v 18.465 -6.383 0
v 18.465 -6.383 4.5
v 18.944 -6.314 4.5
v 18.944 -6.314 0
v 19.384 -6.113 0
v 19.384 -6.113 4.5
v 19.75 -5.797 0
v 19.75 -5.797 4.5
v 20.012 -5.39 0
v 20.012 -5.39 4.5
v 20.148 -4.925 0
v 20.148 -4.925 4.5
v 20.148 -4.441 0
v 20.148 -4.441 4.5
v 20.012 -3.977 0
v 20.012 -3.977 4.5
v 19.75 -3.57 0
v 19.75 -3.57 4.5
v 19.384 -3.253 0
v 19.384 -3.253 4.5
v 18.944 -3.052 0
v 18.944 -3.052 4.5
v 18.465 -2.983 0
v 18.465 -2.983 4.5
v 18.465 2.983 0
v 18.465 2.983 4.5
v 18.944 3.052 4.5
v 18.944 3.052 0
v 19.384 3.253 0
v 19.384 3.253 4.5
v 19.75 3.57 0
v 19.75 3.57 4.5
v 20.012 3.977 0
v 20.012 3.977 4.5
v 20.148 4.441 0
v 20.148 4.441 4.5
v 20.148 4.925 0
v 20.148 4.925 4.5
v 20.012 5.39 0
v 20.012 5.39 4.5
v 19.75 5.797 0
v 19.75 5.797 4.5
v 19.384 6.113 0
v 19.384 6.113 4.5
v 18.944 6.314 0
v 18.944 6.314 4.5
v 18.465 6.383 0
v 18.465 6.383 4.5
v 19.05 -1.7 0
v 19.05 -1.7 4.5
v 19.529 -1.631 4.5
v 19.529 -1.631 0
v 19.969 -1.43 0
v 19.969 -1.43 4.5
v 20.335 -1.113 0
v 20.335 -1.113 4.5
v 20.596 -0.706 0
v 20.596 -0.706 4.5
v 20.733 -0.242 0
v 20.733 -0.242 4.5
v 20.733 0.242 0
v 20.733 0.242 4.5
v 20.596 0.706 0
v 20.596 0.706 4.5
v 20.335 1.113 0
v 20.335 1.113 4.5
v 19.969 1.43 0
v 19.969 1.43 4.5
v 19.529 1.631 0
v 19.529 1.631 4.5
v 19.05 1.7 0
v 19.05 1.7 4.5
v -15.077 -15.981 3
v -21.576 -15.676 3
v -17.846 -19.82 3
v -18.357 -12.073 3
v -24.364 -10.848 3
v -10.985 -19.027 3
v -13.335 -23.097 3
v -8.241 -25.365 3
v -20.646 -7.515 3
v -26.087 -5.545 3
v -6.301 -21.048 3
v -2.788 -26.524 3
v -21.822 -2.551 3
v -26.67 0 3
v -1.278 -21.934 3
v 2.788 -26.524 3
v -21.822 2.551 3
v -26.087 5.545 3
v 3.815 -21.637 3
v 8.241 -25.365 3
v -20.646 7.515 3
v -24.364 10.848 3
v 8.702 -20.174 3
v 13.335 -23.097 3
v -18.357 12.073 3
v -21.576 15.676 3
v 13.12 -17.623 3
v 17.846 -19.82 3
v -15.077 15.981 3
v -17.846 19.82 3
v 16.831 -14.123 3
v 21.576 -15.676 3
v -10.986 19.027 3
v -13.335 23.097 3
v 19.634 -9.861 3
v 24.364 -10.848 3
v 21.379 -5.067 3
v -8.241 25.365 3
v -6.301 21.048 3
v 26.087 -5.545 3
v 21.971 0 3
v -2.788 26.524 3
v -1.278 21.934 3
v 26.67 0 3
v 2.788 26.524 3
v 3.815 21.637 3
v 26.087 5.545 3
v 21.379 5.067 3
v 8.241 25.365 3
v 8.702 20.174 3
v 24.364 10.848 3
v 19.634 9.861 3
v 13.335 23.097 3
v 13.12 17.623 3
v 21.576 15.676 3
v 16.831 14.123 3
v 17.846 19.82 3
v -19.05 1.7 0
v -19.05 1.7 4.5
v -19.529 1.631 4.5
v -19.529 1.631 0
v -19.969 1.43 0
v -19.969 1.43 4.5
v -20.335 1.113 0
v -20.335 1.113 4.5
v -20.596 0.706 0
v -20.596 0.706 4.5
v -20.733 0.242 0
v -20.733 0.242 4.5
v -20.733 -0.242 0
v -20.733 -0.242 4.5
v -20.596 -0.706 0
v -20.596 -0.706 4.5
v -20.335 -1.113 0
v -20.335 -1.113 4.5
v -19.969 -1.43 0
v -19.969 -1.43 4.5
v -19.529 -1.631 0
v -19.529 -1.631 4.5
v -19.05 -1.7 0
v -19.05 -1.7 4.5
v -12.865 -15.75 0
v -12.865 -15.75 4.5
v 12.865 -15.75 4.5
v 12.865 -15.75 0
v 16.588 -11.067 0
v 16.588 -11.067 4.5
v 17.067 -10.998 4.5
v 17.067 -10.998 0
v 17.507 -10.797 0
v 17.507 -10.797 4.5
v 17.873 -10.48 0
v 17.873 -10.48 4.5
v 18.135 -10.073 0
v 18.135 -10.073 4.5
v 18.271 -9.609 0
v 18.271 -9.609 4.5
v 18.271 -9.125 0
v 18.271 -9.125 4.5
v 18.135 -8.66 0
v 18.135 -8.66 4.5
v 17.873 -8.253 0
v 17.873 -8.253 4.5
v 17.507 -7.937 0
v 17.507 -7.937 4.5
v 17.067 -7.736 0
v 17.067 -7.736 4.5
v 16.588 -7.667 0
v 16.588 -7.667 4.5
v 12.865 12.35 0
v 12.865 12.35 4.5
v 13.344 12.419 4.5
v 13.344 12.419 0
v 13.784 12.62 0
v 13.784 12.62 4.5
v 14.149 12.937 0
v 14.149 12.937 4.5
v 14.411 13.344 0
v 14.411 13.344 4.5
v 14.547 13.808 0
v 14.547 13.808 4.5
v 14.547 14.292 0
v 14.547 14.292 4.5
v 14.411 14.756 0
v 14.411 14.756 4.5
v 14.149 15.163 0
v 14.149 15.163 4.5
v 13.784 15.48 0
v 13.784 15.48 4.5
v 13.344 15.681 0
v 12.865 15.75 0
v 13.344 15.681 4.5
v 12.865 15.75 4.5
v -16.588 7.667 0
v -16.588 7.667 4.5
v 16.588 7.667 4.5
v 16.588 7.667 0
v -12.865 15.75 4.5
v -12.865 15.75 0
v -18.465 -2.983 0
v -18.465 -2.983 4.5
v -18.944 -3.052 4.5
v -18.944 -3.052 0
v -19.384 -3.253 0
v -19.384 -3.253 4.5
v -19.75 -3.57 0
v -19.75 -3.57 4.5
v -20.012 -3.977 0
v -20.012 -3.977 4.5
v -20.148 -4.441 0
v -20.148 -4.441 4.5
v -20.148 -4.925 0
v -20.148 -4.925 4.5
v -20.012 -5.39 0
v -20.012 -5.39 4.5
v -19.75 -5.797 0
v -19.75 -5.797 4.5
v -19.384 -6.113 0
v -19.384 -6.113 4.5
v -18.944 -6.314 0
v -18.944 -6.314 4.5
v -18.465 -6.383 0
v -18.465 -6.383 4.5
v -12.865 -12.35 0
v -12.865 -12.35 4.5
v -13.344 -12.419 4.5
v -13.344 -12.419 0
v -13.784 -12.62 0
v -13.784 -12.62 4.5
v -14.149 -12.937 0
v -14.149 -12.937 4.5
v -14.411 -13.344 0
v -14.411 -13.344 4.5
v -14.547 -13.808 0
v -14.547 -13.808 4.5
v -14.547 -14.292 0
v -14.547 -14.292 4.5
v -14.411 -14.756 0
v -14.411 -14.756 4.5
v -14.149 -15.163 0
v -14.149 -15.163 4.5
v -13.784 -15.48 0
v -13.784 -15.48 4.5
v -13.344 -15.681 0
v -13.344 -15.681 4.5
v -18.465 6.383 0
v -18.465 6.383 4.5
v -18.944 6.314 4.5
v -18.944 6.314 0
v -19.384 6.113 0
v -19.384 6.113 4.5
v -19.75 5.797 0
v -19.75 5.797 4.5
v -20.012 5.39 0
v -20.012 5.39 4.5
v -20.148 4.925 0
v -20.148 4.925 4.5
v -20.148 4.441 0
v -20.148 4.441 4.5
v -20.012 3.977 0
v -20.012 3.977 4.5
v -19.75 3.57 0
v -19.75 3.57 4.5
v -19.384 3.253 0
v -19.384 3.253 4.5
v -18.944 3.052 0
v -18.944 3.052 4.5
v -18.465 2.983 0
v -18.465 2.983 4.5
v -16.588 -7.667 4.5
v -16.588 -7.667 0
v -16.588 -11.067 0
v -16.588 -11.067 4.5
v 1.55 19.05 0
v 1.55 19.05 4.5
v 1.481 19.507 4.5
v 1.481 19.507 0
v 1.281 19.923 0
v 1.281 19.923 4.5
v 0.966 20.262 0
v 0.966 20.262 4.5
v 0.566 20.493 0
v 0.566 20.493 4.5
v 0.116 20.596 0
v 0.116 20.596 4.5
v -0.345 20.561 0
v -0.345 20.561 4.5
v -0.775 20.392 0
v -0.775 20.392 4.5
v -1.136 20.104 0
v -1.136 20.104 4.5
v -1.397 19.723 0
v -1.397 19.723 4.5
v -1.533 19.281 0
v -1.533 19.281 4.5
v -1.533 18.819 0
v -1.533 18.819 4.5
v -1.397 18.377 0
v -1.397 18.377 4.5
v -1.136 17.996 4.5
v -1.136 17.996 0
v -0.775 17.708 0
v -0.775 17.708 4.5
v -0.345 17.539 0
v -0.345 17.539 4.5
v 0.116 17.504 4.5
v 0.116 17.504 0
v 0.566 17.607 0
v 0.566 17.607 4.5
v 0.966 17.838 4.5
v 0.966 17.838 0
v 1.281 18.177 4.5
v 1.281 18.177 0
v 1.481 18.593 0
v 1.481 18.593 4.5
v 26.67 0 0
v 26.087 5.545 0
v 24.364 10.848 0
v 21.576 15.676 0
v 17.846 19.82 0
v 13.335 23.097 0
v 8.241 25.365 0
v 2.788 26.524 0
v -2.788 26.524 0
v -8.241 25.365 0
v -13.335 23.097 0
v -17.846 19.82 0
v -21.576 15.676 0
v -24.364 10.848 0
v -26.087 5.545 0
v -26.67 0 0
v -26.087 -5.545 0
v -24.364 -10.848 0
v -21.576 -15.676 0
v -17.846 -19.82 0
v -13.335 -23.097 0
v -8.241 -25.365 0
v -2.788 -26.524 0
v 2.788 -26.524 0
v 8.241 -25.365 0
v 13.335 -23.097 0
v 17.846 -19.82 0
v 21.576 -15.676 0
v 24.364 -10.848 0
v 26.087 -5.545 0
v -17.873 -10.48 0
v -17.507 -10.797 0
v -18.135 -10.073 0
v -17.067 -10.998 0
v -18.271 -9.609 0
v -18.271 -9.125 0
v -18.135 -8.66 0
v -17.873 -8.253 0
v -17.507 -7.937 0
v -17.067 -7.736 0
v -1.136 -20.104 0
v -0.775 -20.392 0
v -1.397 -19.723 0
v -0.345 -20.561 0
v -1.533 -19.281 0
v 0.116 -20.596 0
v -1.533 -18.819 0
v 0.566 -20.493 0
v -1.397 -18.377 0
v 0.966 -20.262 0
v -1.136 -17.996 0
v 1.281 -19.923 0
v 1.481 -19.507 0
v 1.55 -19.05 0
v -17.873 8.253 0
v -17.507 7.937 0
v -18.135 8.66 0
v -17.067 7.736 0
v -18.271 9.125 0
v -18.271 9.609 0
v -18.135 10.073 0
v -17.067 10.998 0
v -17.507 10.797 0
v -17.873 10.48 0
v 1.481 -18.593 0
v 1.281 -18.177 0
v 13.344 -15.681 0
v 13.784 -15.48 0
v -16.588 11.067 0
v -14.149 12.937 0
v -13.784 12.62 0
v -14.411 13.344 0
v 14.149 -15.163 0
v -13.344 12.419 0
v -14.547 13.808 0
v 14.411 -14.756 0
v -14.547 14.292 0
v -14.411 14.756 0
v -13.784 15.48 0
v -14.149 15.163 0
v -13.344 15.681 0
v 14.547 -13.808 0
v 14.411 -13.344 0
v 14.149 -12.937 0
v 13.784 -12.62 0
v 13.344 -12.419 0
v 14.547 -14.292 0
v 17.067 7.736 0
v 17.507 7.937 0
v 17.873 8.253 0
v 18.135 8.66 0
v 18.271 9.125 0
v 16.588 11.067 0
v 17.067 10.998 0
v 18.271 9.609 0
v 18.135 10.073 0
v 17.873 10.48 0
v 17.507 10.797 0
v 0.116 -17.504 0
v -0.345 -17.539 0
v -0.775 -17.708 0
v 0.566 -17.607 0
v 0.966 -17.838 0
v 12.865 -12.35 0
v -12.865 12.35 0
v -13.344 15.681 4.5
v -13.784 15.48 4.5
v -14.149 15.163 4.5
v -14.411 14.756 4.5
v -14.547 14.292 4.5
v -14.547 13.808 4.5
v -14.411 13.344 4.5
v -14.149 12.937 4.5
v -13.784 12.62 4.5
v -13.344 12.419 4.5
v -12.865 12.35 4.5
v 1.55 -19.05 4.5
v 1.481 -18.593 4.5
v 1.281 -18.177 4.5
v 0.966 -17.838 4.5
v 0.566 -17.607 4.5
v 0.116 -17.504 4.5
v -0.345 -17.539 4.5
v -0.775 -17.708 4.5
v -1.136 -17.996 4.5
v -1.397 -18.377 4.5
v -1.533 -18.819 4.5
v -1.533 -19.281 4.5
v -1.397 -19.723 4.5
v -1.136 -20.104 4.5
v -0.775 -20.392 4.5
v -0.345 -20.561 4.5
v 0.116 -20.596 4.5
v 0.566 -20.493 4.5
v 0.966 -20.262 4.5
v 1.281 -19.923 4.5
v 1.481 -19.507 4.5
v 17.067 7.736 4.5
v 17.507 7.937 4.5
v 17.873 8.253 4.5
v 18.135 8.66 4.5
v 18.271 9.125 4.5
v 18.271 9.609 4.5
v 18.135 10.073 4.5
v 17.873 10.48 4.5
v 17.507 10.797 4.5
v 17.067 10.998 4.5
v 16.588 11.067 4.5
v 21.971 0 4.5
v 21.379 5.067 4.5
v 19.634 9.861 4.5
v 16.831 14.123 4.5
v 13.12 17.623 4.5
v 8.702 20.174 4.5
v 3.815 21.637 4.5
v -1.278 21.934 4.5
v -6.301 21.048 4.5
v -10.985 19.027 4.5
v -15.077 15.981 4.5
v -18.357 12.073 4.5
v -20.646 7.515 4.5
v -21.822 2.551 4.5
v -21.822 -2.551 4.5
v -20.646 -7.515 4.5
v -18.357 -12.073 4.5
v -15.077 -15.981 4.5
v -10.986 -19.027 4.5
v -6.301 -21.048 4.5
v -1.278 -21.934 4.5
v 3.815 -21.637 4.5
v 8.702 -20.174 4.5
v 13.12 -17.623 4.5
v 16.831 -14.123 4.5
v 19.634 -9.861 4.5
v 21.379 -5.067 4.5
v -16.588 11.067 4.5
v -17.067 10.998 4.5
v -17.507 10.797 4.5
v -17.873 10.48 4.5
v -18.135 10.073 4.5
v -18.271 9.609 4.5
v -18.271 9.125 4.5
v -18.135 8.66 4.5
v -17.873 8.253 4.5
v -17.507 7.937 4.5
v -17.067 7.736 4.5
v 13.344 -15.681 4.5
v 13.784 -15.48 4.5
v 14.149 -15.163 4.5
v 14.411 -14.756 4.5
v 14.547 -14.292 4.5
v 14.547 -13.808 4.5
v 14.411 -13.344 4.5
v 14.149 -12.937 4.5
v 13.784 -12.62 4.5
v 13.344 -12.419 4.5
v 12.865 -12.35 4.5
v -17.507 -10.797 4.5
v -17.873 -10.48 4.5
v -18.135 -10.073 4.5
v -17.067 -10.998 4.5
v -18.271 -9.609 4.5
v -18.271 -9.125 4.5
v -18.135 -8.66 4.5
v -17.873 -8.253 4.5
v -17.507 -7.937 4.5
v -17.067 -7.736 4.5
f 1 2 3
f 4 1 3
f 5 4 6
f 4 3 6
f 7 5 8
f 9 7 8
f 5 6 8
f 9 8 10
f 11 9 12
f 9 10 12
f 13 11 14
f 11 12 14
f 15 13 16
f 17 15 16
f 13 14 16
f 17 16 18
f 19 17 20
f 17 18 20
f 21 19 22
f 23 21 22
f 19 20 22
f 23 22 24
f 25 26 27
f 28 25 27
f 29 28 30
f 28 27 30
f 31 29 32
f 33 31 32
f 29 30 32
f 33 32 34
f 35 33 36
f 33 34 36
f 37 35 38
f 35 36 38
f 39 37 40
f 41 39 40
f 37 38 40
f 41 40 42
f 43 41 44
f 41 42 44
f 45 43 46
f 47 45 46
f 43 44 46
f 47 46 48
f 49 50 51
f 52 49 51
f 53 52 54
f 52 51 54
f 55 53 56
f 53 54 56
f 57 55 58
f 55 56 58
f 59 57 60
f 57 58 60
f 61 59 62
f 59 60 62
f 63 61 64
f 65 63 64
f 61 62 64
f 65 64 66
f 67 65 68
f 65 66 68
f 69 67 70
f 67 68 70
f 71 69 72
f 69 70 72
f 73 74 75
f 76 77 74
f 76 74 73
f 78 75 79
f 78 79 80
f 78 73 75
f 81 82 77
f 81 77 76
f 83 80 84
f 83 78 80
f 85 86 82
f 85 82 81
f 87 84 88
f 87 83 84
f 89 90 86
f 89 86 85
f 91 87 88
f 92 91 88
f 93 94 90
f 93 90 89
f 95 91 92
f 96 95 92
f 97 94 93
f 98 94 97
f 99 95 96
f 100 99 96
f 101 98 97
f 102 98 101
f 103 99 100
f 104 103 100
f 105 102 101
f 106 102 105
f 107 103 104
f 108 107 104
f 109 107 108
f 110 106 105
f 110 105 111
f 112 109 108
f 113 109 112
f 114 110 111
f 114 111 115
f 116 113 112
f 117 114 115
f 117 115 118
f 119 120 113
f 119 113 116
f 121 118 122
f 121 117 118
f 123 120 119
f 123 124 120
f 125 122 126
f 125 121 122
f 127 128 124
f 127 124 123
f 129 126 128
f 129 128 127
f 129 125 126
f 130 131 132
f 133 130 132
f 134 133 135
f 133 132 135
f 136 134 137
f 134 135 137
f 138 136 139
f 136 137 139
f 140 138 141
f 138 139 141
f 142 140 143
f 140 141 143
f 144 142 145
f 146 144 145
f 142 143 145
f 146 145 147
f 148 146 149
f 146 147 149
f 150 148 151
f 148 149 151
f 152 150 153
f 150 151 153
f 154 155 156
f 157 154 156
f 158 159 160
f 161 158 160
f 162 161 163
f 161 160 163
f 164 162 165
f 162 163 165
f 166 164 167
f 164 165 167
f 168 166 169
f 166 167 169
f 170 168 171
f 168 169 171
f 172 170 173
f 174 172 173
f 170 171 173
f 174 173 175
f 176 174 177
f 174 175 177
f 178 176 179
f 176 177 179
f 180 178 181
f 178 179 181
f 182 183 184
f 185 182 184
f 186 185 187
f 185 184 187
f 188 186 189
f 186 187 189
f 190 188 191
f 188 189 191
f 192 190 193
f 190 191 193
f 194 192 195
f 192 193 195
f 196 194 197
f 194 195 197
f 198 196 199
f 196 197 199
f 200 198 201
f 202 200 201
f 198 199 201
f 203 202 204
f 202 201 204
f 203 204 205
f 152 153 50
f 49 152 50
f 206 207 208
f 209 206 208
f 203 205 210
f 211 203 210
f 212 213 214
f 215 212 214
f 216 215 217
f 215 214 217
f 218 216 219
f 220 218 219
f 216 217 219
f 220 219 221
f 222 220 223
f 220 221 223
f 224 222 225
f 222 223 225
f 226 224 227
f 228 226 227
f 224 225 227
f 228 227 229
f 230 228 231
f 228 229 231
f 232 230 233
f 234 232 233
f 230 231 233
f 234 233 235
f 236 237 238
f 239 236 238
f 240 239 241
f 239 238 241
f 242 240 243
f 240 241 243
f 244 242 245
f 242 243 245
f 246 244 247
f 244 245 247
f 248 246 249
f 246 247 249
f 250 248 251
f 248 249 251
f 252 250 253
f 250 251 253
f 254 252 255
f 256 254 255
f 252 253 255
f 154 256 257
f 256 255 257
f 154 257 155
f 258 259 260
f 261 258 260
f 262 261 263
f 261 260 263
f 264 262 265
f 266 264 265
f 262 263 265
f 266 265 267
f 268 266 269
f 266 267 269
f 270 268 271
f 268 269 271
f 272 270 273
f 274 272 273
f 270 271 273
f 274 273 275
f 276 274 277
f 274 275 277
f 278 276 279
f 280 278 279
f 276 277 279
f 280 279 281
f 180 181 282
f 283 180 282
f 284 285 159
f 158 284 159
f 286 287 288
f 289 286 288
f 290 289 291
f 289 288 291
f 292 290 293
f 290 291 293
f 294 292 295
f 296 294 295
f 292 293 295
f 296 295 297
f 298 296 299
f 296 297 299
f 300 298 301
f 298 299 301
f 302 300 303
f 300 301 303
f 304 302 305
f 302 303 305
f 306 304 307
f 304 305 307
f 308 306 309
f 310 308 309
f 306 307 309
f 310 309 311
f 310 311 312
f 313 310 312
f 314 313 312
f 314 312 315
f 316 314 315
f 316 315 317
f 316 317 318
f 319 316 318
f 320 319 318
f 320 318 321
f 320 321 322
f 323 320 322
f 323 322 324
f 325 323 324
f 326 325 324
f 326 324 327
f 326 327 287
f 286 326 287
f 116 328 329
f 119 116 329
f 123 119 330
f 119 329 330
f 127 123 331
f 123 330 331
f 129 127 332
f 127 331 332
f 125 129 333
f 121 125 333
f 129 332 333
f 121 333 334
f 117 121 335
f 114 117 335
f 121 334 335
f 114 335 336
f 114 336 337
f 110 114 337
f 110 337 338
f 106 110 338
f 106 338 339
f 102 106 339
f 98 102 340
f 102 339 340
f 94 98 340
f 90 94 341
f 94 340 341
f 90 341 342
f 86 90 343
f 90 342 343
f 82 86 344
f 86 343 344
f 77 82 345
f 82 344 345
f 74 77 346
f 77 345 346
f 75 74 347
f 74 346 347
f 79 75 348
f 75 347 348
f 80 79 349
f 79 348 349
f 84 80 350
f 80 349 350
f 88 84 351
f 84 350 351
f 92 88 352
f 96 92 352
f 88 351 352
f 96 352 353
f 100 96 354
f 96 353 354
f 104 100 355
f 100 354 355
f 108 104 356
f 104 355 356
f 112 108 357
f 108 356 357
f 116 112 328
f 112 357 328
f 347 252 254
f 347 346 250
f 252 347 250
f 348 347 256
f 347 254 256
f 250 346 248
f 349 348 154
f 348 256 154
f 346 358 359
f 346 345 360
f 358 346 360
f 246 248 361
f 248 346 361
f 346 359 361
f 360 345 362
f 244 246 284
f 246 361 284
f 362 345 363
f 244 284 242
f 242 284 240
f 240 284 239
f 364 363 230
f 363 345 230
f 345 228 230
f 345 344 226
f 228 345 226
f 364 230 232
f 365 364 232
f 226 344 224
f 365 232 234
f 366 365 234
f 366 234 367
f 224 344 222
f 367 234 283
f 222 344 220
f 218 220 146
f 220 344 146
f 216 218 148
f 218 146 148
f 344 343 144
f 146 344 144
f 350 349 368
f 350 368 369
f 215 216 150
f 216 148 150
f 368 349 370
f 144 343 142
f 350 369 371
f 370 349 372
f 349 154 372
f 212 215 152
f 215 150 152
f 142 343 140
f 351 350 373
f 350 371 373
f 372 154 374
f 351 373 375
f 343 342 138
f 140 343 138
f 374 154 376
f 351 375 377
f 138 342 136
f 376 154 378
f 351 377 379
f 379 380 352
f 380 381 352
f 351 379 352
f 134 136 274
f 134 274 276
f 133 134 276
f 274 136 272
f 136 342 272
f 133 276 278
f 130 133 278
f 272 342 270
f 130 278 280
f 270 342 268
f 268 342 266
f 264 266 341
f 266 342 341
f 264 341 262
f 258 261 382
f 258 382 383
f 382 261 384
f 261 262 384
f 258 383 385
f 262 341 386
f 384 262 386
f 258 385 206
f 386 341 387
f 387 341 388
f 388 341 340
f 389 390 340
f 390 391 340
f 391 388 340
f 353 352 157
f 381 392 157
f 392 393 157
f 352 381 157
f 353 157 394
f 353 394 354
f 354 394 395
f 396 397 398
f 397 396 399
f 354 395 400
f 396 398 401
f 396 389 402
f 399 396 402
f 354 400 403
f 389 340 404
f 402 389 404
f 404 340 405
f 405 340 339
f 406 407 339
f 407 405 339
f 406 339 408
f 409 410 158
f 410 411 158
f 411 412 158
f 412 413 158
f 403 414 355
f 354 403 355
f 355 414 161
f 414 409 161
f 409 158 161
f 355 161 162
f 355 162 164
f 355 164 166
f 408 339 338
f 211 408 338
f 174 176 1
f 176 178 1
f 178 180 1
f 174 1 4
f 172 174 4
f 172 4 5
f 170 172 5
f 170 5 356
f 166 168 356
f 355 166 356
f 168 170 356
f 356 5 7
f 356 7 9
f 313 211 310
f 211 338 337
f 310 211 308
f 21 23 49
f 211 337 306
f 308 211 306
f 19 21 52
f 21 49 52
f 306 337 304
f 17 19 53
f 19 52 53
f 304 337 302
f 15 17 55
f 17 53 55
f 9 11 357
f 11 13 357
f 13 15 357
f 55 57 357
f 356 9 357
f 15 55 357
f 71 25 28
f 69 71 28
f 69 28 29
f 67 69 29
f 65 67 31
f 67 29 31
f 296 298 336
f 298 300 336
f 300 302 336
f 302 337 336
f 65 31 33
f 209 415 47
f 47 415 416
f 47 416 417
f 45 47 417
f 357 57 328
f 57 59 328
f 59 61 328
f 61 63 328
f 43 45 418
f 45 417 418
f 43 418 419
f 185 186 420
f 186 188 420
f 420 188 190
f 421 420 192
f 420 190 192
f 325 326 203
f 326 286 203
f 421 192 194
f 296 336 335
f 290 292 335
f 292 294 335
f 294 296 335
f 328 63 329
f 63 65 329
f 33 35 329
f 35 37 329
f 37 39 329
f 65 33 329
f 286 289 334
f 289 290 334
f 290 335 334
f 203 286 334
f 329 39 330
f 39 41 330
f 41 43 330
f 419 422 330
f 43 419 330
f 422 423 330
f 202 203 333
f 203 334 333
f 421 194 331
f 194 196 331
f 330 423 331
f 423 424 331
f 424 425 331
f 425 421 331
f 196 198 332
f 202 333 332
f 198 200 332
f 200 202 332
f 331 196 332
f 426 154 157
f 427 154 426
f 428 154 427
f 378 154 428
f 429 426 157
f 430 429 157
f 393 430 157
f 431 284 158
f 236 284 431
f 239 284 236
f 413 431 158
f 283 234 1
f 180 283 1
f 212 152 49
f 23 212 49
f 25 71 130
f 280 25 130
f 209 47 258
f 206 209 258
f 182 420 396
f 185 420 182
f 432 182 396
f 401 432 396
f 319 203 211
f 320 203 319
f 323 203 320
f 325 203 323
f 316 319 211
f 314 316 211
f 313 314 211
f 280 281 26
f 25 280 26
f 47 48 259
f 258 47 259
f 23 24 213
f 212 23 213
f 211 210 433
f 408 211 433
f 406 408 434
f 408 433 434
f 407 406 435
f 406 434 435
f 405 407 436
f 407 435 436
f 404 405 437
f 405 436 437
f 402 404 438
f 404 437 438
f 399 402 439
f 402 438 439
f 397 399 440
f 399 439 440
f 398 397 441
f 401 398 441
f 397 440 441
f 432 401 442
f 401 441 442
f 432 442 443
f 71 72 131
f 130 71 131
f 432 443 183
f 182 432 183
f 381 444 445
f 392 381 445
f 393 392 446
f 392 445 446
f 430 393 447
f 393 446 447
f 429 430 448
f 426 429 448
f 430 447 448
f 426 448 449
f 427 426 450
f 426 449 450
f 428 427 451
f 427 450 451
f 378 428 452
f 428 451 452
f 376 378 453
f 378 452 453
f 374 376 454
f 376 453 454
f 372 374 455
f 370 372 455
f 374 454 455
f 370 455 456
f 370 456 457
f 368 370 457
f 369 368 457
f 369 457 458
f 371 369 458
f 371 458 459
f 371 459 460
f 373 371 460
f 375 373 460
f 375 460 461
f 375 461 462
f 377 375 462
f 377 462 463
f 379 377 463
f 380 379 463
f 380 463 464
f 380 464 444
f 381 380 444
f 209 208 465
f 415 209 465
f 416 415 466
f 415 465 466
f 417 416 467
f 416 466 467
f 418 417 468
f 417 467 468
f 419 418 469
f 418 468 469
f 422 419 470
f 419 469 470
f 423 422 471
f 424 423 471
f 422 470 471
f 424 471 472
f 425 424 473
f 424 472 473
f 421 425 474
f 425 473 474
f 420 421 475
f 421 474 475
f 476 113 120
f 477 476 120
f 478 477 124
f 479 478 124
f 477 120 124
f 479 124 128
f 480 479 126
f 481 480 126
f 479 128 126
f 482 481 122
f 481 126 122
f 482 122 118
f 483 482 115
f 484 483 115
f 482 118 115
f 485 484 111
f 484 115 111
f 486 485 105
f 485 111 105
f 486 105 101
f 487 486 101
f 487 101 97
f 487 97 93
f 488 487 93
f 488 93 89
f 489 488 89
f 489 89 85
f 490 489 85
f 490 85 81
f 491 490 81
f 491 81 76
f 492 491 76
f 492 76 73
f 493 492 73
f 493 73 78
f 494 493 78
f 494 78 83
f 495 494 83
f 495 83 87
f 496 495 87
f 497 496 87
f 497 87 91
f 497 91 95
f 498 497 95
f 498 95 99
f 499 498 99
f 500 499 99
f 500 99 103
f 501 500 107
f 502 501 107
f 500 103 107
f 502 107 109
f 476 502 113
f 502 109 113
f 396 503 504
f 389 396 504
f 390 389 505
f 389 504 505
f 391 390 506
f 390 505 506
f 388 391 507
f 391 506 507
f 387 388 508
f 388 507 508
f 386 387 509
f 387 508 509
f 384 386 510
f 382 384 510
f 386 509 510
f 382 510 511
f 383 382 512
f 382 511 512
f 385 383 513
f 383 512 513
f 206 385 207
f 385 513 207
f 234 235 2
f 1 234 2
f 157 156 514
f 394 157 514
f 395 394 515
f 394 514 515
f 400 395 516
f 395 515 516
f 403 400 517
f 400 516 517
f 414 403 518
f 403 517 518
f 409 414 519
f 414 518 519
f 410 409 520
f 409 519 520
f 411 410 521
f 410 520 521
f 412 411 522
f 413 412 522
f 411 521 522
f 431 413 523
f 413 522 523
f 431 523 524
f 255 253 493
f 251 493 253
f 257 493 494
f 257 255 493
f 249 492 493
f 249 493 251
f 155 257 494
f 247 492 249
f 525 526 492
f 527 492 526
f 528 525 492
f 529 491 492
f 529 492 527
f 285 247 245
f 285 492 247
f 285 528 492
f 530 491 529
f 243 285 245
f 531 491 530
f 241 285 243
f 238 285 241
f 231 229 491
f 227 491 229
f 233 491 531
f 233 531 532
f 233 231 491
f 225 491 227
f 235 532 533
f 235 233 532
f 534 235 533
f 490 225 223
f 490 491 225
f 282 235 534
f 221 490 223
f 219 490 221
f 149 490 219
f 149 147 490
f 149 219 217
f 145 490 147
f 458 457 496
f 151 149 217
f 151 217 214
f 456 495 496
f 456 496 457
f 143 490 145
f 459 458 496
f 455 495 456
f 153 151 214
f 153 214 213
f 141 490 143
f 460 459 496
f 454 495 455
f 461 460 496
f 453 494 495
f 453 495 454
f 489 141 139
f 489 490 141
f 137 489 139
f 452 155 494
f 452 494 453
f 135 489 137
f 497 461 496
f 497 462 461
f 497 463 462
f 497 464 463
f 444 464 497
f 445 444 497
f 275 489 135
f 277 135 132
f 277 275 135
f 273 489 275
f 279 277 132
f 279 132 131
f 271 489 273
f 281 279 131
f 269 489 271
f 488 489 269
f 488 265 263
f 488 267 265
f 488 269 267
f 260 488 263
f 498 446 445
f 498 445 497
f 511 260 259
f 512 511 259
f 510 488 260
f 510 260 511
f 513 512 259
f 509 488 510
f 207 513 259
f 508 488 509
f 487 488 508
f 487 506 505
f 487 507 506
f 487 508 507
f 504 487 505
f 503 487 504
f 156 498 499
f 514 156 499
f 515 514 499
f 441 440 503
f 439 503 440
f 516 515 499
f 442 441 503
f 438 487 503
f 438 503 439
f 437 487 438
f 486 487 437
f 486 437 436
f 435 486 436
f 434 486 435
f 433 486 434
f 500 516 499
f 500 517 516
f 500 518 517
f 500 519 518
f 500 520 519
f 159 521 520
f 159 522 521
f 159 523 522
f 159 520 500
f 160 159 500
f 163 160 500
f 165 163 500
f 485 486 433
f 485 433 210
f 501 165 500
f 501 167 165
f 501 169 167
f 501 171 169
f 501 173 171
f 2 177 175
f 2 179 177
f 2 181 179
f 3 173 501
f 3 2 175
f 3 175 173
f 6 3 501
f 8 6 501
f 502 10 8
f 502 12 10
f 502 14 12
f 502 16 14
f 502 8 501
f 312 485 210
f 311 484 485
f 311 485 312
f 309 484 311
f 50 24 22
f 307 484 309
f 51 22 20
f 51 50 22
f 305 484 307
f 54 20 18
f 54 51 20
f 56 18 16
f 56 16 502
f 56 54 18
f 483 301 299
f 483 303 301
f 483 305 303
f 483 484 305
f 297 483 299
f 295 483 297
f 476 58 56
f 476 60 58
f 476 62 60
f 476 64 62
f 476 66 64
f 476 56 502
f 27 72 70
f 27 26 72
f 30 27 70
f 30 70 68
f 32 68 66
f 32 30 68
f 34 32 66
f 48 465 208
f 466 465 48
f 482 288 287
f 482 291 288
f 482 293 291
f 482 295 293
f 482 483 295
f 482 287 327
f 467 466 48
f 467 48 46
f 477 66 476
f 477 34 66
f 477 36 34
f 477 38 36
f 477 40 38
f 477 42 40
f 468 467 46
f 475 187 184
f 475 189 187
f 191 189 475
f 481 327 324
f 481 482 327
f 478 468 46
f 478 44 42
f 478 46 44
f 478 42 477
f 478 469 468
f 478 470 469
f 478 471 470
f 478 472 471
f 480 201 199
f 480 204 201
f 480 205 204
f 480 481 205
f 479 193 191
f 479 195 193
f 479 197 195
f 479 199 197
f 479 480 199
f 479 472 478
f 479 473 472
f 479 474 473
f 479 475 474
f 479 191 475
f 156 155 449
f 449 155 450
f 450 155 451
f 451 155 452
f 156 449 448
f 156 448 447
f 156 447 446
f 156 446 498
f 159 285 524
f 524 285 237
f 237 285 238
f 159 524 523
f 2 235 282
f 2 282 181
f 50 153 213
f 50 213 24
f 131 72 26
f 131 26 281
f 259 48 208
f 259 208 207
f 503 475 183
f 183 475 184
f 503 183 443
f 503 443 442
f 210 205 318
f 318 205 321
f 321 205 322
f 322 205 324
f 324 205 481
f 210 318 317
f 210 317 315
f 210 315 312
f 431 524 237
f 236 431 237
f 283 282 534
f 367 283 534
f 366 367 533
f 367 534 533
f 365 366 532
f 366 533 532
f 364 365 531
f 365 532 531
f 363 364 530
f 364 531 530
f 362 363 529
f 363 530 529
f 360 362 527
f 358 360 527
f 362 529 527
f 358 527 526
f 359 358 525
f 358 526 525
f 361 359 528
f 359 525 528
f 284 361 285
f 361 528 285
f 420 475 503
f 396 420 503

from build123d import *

# Parameters (mm, degrees)
SKETCH1_R           = 26.67
SKETCH1_R_2         = 21.971
SKETCH1_R_3         = 18.5
BOSS_EXTRUDE1_DEPTH = 3
SKETCH1_3_R         = 21.971
SKETCH1_3_R_2       = 18.5
BOSS_EXTRUDE2_DEPTH = 4.5
SKETCH2_R           = 1.55
CUT_EXTRUDE2_DEPTH  = 38.984573184


with BuildPart() as part:
    # Sketch1 → Boss-Extrude1 (new body)
    # profile 1 of 3: a face of its own
    with BuildSketch(Plane.XY):
        Circle(SKETCH1_R)
        Circle(SKETCH1_R_2, mode=Mode.SUBTRACT)
    # profile 2 of 3: a face of its own
    with BuildSketch(Plane.XY):
        Circle(SKETCH1_R_2)
        Circle(SKETCH1_R_3, mode=Mode.SUBTRACT)
    # profile 3 of 3: a face of its own
    with BuildSketch(Plane.XY):
        Circle(SKETCH1_R_3)
    extrude(amount=BOSS_EXTRUDE1_DEPTH)

    # Sketch1<3> → Boss-Extrude2 (add)
    # profile 1 of 2: a face of its own
    with BuildSketch(Plane.XY):
        Circle(SKETCH1_3_R)
        Circle(SKETCH1_3_R_2, mode=Mode.SUBTRACT)
    # profile 2 of 2: a face of its own
    with BuildSketch(Plane.XY):
        Circle(SKETCH1_3_R_2)
    extrude(amount=BOSS_EXTRUDE2_DEPTH)

    # Sketch2 → Cut-Extrude2 (cut, through all)
    with BuildSketch(Plane.XY.offset(4.5)):
        with Locations((0, 19.05)):
            Circle(SKETCH2_R)
        with Locations((0, -19.05)):
            Circle(SKETCH2_R)
        with BuildLine():
            Line((-12.86468033, 12.35), (12.86468033, 12.35))
            ThreePointArc((12.86468033, 12.35), (14.56468033, 14.05), (12.86468033, 15.75))
            Line((12.86468033, 15.75), (-12.86468033, 15.75))
            ThreePointArc((-12.86468033, 15.75), (-14.56468033, 14.05), (-12.86468033, 12.35))
        make_face()
        with BuildLine():
            Line((-16.588190244, 7.666666667), (16.588190244, 7.666666667))
            ThreePointArc((16.588190244, 7.666666667), (18.288190244, 9.366666667), (16.588190244, 11.066666667))
            Line((16.588190244, 11.066666667), (-16.588190244, 11.066666667))
            ThreePointArc((-16.588190244, 11.066666667), (-18.288190244, 9.366666667), (-16.588190244, 7.666666667))
        make_face()
        with BuildLine():
            Line((-18.465342913, 2.983333333), (18.465342913, 2.983333333))
            ThreePointArc((18.465342913, 2.983333333), (20.165342913, 4.683333333), (18.465342913, 6.383333333))
            Line((18.465342913, 6.383333333), (-18.465342913, 6.383333333))
            ThreePointArc((-18.465342913, 6.383333333), (-20.165342913, 4.683333333), (-18.465342913, 2.983333333))
        make_face()
        with BuildLine():
            Line((-19.05, -1.7), (19.05, -1.7))
            ThreePointArc((19.05, -1.7), (20.75, 0), (19.05, 1.7))
            Line((19.05, 1.7), (-19.05, 1.7))
            ThreePointArc((-19.05, 1.7), (-20.75, 0), (-19.05, -1.7))
        make_face()
        with BuildLine():
            Line((-18.465342913, -6.383333333), (18.465342913, -6.383333333))
            ThreePointArc((18.465342913, -6.383333333), (20.165342913, -4.683333333), (18.465342913, -2.983333333))
            Line((18.465342913, -2.983333333), (-18.465342913, -2.983333333))
            ThreePointArc((-18.465342913, -2.983333333), (-20.165342913, -4.683333333), (-18.465342913, -6.383333333))
        make_face()
        with BuildLine():
            Line((-16.588190244, -11.066666667), (16.588190244, -11.066666667))
            ThreePointArc((16.588190244, -11.066666667), (18.288190244, -9.366666667), (16.588190244, -7.666666667))
            Line((16.588190244, -7.666666667), (-16.588190244, -7.666666667))
            ThreePointArc((-16.588190244, -7.666666667), (-18.288190244, -9.366666667), (-16.588190244, -11.066666667))
        make_face()
        with BuildLine():
            Line((-12.86468033, -15.75), (12.86468033, -15.75))
            ThreePointArc((12.86468033, -15.75), (14.56468033, -14.05), (12.86468033, -12.35))
            Line((12.86468033, -12.35), (-12.86468033, -12.35))
            ThreePointArc((-12.86468033, -12.35), (-14.56468033, -14.05), (-12.86468033, -15.75))
        make_face()
    extrude(amount=-CUT_EXTRUDE2_DEPTH, mode=Mode.SUBTRACT)


solid = part.part
